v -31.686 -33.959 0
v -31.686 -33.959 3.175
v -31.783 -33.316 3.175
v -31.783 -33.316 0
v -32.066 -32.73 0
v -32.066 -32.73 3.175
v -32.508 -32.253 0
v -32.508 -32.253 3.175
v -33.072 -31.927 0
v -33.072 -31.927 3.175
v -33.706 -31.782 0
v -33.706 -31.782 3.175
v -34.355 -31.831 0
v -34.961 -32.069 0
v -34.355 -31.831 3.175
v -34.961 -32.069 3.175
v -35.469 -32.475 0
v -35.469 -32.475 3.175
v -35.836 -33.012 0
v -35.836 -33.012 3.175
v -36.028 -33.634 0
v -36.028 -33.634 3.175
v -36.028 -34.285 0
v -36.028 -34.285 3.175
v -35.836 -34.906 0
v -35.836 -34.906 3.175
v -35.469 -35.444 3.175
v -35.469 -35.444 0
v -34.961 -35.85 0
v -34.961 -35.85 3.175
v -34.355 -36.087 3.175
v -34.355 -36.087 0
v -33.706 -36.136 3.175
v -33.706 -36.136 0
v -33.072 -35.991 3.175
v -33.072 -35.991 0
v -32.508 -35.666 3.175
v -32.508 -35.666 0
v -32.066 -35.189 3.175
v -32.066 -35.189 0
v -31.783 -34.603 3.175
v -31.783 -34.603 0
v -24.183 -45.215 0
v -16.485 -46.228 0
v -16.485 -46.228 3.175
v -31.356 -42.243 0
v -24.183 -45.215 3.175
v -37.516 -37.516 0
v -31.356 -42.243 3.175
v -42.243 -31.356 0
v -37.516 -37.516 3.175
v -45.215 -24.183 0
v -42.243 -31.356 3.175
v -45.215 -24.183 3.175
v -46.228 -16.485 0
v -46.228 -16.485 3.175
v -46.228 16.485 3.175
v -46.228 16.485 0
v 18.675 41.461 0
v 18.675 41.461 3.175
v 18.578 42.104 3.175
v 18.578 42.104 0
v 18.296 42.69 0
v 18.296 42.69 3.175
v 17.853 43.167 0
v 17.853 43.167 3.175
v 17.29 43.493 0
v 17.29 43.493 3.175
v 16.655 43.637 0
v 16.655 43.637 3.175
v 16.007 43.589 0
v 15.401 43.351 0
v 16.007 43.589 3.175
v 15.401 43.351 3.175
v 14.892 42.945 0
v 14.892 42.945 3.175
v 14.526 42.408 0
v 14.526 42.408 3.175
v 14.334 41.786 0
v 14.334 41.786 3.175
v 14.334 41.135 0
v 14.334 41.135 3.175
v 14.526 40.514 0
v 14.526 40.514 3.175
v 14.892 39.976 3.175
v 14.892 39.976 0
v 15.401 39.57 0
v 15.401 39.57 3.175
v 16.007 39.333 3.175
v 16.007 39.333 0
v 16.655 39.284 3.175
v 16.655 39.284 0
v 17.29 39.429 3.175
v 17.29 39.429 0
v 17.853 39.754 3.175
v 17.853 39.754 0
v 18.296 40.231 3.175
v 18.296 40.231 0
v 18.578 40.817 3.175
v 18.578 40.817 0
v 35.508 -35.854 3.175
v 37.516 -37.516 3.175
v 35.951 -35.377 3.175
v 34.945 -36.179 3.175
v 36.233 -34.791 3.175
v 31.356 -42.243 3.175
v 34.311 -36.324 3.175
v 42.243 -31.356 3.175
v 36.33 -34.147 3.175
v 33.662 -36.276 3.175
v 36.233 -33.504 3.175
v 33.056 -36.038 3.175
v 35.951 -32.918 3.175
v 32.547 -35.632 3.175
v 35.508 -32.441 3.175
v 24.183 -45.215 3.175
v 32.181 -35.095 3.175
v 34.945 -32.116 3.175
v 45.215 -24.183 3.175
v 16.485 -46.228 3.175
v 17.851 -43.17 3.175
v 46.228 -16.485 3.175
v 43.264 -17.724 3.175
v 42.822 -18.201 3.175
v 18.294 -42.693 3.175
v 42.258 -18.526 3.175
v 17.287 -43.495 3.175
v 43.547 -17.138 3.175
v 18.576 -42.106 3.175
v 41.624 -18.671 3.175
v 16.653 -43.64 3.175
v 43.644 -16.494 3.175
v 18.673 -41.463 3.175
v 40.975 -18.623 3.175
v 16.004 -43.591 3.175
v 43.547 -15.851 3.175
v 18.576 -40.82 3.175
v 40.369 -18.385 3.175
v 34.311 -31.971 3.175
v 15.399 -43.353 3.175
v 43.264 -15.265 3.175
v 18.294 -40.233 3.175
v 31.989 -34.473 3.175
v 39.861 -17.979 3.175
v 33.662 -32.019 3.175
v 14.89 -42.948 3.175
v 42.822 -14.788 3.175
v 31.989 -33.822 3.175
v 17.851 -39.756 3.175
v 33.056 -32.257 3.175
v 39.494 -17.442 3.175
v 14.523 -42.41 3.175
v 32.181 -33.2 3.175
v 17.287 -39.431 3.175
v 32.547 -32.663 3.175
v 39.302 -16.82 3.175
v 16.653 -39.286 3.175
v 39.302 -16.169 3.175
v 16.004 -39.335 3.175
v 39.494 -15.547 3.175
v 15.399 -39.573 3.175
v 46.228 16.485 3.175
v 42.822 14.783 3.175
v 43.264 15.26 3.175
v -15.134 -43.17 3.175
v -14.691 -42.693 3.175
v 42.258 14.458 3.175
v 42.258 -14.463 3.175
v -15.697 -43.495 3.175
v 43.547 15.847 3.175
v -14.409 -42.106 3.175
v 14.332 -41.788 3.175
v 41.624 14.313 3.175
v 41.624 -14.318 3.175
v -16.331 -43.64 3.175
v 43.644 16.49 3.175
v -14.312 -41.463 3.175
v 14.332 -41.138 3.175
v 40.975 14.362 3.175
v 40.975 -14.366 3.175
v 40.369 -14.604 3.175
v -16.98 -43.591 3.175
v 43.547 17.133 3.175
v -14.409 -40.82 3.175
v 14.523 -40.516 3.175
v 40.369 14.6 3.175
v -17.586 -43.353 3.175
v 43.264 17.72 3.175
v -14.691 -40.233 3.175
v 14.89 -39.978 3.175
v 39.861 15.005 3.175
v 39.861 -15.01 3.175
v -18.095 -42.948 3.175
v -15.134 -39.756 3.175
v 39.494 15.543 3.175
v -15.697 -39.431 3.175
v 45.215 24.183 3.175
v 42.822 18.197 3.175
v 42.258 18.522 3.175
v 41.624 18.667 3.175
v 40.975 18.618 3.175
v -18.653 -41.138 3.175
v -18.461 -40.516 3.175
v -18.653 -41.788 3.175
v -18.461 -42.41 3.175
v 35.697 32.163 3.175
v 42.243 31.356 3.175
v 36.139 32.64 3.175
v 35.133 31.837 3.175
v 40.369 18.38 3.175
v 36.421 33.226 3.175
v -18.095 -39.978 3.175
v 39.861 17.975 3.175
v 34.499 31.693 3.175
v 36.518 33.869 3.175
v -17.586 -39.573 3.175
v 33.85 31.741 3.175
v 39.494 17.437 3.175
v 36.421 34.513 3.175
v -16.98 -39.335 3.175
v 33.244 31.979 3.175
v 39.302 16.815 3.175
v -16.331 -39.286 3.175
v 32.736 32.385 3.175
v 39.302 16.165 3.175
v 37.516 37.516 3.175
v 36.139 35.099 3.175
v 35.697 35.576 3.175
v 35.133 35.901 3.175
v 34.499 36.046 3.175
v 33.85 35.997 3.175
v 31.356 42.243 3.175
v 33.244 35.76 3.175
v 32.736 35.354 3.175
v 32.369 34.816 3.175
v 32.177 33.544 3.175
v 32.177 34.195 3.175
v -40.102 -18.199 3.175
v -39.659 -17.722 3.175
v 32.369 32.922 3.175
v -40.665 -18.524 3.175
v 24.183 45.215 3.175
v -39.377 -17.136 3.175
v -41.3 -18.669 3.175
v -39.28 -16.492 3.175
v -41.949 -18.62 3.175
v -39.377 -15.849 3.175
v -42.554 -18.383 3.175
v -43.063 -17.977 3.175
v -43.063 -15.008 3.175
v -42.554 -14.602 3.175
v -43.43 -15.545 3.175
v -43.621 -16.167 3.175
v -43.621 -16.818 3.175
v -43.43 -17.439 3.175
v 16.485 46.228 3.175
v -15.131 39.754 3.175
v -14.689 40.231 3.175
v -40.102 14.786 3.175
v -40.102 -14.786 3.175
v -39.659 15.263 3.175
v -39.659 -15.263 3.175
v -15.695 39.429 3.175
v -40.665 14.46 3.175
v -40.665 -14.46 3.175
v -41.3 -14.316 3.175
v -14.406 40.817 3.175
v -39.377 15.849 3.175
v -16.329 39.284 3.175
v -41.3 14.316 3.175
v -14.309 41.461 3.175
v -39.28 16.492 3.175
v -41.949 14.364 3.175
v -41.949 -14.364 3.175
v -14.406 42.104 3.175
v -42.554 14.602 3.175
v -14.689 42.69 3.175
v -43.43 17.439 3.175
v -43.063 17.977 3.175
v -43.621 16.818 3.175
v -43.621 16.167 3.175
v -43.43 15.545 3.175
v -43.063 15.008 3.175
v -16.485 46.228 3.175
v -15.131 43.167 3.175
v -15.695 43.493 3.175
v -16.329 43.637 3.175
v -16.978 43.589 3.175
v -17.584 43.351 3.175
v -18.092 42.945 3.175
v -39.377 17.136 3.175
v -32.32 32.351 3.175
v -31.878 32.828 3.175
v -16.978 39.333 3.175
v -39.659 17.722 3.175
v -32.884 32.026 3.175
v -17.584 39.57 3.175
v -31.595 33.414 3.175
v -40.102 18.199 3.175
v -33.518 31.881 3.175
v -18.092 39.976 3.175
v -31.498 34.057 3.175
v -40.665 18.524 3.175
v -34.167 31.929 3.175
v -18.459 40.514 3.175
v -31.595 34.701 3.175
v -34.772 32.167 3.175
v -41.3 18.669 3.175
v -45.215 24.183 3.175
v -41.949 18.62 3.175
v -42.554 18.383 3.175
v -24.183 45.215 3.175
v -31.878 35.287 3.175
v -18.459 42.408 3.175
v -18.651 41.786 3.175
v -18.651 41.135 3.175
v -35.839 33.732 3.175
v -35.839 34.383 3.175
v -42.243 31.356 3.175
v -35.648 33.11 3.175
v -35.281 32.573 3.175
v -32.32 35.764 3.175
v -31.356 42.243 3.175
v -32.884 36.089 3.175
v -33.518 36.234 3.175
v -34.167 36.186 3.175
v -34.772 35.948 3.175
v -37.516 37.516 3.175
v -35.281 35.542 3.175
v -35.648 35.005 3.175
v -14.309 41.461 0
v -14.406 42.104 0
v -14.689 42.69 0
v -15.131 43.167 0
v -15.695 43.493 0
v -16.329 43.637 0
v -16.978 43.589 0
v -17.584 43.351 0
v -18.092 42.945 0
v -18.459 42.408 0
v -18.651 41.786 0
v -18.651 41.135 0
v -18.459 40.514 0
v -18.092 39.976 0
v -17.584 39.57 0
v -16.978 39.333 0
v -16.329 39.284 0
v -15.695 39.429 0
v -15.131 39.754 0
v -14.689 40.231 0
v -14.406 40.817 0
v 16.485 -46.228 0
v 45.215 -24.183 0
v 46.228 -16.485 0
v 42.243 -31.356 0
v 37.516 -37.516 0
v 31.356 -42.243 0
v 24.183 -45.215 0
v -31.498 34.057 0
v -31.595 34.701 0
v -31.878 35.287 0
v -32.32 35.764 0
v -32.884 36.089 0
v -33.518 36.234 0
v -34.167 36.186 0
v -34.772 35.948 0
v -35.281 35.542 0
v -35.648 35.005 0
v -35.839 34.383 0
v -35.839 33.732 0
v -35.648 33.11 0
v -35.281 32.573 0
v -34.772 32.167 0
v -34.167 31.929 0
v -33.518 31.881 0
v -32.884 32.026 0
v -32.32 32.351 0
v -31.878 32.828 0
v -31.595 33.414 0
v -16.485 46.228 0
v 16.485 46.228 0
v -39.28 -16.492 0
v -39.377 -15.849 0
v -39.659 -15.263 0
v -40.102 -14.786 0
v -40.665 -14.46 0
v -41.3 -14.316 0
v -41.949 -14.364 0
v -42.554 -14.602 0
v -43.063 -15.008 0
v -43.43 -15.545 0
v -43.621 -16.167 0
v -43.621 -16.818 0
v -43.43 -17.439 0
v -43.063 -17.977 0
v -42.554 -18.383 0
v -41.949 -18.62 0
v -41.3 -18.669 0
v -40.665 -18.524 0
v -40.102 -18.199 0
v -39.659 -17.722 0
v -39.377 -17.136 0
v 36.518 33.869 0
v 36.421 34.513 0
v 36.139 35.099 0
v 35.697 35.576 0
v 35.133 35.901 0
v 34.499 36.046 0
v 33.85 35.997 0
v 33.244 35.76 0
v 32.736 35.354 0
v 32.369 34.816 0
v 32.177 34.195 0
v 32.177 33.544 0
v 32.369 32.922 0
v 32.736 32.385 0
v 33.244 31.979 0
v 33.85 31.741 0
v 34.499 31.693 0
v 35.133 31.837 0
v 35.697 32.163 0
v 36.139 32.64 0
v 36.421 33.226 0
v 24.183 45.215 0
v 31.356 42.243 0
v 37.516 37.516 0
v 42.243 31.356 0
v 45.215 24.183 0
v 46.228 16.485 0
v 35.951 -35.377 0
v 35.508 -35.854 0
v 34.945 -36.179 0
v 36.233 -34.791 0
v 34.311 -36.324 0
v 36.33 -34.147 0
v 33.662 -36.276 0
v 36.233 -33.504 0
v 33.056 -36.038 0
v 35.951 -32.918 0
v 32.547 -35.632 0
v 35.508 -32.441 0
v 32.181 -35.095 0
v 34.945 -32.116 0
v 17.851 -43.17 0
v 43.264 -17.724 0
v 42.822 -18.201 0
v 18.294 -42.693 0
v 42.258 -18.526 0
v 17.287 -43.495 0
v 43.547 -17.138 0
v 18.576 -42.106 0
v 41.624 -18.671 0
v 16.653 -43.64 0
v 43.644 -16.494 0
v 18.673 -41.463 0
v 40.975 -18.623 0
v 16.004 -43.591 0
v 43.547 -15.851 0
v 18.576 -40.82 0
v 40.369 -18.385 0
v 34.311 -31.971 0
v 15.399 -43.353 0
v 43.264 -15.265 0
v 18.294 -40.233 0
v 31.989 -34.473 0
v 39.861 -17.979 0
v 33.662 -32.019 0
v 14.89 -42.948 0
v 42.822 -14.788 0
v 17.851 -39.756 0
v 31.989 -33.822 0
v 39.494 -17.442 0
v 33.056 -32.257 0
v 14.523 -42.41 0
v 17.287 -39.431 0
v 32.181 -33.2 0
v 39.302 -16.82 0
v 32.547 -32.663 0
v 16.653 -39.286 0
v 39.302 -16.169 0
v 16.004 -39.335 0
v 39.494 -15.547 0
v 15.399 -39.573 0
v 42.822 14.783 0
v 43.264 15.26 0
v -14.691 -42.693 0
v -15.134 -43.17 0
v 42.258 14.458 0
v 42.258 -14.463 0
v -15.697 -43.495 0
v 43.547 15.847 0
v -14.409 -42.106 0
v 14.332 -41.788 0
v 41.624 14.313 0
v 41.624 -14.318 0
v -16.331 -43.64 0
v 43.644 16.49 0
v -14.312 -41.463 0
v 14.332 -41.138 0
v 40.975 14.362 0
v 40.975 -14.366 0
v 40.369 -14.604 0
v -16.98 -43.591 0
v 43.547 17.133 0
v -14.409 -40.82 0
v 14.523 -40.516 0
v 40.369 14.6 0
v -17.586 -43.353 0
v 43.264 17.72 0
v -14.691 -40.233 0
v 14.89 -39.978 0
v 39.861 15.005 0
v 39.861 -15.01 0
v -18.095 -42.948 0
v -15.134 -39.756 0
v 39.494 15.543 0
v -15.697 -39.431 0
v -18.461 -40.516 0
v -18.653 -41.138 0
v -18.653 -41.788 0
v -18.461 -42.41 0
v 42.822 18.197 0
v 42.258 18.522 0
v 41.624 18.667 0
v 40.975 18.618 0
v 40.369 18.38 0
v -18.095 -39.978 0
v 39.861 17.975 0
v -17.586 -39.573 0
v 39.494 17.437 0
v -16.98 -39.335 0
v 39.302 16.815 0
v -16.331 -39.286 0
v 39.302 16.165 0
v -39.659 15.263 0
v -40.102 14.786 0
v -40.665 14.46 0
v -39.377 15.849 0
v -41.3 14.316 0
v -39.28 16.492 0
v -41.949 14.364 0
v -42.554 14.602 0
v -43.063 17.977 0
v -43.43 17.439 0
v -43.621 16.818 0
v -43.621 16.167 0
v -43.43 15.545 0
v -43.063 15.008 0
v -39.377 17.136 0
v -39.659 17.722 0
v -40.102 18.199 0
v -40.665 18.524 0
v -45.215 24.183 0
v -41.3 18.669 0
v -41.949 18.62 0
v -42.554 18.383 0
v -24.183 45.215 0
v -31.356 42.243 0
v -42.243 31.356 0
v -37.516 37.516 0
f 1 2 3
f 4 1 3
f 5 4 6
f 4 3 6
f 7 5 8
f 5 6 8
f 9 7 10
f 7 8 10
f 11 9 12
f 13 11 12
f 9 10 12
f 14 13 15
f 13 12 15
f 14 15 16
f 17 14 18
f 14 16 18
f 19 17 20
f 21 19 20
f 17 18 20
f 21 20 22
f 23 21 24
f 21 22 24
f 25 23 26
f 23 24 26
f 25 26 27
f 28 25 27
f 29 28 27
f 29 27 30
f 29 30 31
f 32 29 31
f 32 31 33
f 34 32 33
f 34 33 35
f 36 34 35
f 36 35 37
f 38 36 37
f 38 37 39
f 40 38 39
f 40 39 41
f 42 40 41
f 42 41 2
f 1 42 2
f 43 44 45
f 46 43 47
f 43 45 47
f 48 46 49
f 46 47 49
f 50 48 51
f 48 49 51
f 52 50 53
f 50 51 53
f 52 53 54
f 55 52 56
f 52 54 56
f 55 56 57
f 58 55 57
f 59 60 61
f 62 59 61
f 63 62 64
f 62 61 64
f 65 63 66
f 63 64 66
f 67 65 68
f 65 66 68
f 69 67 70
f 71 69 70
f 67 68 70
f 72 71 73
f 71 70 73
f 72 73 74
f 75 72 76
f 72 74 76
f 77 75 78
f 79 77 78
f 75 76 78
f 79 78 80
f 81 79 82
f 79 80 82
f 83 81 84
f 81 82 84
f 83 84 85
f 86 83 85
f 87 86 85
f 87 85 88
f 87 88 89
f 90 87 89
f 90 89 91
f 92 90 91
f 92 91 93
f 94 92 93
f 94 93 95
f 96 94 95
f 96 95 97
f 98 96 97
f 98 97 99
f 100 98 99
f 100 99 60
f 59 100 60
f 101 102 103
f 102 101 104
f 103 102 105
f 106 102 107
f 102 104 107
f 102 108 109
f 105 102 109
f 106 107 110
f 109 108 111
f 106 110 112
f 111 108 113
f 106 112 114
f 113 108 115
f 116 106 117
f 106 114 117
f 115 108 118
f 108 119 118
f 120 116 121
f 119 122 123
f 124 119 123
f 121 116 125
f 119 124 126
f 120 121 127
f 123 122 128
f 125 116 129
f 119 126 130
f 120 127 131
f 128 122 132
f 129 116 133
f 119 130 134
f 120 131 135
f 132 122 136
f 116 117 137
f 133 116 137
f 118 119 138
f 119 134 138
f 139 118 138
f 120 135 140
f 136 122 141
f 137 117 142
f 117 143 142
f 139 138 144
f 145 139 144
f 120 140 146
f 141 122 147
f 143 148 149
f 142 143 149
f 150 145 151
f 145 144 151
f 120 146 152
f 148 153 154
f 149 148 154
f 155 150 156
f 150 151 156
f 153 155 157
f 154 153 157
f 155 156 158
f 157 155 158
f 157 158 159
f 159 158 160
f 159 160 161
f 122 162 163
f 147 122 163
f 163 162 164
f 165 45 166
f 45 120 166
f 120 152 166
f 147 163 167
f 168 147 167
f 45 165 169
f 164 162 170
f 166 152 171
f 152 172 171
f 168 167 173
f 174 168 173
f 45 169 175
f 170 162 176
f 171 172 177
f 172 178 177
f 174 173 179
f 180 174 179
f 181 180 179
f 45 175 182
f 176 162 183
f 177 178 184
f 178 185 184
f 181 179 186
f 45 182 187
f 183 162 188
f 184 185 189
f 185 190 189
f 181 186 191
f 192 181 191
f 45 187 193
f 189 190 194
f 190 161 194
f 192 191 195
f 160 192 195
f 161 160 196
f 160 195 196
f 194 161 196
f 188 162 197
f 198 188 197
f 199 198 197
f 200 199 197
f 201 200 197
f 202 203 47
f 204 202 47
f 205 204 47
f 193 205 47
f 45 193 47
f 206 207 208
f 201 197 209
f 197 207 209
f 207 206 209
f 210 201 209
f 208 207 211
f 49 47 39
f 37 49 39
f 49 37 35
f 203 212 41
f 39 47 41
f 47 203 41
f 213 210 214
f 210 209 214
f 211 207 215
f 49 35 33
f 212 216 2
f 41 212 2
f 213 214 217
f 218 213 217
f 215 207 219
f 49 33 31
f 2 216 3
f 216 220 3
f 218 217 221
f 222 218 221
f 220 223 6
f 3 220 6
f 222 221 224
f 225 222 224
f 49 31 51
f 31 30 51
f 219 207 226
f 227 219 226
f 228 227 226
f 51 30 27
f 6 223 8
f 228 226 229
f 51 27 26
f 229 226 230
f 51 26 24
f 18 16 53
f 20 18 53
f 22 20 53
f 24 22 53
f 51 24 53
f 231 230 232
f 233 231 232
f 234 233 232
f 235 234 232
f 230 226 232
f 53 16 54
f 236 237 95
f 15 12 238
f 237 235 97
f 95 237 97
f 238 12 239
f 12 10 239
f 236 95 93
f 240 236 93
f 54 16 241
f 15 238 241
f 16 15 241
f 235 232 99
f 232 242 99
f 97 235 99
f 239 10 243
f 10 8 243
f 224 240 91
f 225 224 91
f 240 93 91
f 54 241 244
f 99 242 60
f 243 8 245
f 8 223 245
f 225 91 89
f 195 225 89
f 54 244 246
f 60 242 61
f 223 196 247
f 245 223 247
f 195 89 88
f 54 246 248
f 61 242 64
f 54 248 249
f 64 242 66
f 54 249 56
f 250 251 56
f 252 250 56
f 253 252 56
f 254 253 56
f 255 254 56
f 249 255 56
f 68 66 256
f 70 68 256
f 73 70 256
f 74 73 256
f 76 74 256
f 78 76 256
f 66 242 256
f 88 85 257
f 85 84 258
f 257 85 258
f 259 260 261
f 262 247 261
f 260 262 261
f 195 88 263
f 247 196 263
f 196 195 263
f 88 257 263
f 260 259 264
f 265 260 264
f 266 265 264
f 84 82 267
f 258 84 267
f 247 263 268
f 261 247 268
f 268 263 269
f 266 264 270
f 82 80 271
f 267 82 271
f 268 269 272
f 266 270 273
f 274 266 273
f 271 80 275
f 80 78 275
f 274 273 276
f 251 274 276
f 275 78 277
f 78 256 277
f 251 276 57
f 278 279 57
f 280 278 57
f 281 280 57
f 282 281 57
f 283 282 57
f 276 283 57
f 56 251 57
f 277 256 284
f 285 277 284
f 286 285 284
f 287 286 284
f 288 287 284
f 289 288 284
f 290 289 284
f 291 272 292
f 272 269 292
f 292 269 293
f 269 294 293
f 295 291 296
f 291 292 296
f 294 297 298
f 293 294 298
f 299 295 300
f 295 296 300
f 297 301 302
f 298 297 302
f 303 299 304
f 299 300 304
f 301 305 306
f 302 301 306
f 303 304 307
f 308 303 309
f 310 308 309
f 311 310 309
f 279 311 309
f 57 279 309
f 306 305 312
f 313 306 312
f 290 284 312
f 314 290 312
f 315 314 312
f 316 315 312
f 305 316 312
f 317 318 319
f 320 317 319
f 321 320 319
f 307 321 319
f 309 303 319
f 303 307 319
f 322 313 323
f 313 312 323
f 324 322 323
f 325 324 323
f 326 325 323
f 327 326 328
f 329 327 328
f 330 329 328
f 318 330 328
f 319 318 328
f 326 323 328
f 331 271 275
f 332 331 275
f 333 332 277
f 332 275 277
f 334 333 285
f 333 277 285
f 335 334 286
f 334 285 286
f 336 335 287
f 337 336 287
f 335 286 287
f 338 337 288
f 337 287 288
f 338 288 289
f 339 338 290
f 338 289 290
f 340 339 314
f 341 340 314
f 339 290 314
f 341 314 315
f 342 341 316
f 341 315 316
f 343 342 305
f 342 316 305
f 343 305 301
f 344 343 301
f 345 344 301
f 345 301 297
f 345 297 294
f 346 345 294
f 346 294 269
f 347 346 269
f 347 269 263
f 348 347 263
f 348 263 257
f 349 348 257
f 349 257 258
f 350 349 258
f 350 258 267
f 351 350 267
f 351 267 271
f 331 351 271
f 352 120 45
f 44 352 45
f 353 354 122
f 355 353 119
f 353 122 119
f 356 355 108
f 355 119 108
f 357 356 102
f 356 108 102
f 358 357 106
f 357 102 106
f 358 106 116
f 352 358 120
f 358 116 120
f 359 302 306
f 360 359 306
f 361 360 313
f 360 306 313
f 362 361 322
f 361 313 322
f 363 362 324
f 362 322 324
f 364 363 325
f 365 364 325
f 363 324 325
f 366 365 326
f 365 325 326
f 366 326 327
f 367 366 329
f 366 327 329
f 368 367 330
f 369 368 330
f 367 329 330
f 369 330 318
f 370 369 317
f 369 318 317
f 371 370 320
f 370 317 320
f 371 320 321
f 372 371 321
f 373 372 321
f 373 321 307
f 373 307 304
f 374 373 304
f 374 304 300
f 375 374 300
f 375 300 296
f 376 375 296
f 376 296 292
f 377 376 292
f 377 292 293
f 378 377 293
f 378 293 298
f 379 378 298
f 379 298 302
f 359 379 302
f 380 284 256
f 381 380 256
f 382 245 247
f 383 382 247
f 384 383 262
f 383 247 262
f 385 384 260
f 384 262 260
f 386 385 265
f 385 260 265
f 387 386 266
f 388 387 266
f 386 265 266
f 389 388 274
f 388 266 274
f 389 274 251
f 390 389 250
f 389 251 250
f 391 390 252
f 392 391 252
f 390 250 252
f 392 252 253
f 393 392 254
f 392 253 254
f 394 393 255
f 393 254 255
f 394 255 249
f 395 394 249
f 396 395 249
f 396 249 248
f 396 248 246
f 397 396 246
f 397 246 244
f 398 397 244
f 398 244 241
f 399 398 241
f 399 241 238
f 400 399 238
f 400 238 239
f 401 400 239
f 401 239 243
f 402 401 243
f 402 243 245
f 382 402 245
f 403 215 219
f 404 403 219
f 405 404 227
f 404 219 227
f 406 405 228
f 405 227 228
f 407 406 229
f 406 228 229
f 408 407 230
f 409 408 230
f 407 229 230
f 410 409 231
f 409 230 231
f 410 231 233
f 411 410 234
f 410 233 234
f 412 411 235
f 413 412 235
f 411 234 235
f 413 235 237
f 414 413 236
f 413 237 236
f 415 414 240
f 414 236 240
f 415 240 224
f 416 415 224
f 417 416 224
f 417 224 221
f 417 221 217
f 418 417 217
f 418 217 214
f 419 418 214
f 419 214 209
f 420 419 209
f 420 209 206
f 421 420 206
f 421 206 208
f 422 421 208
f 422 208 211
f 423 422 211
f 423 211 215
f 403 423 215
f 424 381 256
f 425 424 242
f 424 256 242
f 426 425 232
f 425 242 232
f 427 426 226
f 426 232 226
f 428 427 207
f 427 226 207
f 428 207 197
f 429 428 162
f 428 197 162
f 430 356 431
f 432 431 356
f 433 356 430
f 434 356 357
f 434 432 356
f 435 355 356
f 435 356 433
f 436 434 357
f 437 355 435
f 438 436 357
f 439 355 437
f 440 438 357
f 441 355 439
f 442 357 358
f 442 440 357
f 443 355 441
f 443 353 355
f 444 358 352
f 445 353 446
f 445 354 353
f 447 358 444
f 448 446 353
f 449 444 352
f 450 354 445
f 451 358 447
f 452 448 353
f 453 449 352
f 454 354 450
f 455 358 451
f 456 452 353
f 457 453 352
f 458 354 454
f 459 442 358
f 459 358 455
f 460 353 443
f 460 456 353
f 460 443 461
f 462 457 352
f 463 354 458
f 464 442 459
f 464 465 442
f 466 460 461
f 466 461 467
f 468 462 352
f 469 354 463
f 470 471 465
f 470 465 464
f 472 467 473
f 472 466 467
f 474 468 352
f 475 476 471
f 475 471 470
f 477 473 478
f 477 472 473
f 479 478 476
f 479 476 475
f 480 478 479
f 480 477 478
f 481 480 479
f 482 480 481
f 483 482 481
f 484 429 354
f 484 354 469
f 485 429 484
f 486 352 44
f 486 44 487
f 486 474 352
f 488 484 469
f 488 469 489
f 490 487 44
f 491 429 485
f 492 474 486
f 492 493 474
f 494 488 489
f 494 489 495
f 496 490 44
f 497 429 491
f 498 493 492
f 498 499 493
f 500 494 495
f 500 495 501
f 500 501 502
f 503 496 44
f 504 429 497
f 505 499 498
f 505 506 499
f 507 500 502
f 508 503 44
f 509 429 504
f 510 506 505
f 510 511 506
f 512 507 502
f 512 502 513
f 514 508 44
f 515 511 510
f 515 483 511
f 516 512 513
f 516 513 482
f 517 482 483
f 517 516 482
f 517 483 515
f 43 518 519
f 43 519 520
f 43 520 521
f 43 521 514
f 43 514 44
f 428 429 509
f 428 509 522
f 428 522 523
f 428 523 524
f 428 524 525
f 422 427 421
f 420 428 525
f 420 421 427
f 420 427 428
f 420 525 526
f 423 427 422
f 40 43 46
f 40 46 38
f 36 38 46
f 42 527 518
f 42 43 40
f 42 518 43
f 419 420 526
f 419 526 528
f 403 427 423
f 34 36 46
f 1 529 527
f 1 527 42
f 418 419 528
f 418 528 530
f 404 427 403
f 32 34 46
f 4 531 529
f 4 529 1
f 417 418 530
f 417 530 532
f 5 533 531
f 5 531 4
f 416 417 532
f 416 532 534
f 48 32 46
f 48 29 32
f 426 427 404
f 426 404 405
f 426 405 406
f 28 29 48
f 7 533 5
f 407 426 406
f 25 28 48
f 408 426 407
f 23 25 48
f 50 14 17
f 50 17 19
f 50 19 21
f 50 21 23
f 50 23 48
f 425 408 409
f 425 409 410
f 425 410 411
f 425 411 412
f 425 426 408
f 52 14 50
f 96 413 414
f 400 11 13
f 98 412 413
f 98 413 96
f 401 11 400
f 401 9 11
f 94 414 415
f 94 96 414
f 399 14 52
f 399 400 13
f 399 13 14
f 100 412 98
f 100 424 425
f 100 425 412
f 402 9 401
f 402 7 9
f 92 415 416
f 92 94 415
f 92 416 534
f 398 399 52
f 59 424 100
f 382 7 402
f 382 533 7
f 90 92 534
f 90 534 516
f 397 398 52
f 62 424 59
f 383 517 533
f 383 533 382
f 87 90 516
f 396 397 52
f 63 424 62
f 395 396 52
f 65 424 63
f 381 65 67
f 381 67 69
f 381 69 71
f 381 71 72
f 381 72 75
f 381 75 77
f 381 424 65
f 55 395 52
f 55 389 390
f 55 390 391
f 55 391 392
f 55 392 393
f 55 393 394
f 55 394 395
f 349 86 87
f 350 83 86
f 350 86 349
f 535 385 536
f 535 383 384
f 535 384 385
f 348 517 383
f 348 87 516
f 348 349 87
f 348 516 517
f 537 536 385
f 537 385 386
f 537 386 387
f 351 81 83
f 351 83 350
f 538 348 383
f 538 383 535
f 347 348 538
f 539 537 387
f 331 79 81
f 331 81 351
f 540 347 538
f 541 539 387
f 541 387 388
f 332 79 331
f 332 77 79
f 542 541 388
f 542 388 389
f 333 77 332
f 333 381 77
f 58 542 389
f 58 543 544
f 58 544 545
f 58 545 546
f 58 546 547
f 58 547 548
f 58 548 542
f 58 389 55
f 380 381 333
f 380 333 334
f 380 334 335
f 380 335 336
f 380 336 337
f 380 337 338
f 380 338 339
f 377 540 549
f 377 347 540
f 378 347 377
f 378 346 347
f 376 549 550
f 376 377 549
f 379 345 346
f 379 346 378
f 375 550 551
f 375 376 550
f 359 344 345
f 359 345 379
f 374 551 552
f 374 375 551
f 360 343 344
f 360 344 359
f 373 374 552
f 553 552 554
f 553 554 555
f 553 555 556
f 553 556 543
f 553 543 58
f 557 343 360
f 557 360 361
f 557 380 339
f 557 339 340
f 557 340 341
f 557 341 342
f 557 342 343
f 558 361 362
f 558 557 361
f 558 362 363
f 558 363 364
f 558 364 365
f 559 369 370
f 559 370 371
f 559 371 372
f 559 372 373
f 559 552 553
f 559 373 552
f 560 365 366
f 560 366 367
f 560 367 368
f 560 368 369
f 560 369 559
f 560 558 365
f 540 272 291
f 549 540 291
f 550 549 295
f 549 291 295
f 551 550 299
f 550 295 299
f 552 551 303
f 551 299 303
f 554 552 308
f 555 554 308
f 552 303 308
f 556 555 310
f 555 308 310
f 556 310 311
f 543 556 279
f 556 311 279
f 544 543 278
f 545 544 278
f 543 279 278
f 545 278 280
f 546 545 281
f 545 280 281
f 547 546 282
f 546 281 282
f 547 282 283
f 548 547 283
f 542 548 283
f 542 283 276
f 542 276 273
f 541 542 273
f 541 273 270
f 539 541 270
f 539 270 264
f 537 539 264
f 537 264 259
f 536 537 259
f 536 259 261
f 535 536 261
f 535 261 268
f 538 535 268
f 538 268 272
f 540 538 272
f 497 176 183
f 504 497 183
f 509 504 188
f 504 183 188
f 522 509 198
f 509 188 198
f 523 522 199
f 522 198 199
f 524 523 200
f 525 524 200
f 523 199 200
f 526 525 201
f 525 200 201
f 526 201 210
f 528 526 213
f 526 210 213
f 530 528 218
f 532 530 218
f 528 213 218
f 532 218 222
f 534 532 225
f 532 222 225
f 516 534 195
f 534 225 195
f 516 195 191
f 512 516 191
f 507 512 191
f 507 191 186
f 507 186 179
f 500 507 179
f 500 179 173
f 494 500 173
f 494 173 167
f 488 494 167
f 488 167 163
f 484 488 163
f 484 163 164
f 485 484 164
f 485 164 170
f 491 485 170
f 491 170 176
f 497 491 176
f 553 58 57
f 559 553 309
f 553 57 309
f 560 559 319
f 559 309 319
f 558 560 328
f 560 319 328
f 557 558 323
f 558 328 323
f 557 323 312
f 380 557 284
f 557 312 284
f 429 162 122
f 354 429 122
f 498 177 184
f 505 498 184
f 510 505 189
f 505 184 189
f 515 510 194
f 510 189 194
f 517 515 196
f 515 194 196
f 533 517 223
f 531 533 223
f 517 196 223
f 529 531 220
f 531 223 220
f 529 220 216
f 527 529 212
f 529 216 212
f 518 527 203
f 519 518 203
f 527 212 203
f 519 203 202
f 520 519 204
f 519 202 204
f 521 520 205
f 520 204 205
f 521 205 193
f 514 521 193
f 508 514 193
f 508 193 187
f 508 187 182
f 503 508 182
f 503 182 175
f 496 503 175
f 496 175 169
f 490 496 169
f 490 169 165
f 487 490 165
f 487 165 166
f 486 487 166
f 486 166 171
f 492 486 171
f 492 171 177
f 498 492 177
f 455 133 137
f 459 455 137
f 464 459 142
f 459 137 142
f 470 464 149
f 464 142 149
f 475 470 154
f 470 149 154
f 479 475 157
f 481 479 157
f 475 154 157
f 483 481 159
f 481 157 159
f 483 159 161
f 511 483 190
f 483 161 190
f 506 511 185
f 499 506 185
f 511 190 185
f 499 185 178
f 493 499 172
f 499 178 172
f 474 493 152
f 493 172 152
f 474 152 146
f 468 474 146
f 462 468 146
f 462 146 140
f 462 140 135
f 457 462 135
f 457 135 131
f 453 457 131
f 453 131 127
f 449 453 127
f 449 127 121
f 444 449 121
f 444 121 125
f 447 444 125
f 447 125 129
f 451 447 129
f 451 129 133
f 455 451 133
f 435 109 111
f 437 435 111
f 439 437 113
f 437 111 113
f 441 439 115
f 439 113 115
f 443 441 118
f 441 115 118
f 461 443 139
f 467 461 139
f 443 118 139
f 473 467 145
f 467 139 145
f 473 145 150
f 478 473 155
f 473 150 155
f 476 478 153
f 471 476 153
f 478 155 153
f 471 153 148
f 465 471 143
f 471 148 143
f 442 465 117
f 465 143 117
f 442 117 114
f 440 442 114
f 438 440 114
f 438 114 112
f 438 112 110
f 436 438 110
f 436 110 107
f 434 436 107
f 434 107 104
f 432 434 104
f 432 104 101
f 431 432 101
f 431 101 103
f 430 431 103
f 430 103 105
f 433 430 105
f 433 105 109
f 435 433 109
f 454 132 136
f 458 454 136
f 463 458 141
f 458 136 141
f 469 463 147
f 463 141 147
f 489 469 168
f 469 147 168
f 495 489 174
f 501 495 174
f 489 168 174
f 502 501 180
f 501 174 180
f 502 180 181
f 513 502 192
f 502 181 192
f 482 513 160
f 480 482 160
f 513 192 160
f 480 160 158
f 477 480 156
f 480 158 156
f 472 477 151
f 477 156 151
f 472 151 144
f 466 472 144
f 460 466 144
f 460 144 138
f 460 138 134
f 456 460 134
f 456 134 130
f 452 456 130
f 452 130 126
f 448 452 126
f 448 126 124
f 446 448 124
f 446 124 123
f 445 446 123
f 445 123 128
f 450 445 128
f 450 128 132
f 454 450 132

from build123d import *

# Parameters (mm, degrees)
BOSS_EXTRUDE1_DEPTH = 3.175
CUT_EXTRUDE2_REACH  = 69.068
SKETCH3_R           = 2.1828125
SKETCH4_W           = 109.59125296
SKETCH4_H           = 128.097404578
CUT_EXTRUDE3_DEPTH  = 68.067905193


with BuildPart() as part:
    # Sketch1 → Boss-Extrude1 (new body)
    with BuildSketch(Plane.XY):
        with BuildLine():
            Line((46.57725, -47.371), (-46.57725, -47.371))
            ThreePointArc((-46.57725, -47.371), (-47.138516008, -47.138516008), (-47.371, -46.57725))
            Line((-47.371, -46.57725), (-47.371, 46.57725))
            ThreePointArc((-47.371, 46.57725), (-47.138516008, 47.138516008), (-46.57725, 47.371))
            Line((-46.57725, 47.371), (46.57725, 47.371))
            ThreePointArc((46.57725, 47.371), (47.138516008, 47.138516008), (47.371, 46.57725))
            Line((47.371, 46.57725), (47.371, -46.57725))
            ThreePointArc((47.371, -46.57725), (47.138516008, -47.138516008), (46.57725, -47.371))
        make_face()
    extrude(amount=BOSS_EXTRUDE1_DEPTH)

    # Sketch3 → Cut-Extrude2 (cut, up to next)
    with BuildSketch(Plane.XY.offset(3.175), mode=Mode.PRIVATE) as cut_extrude2_sk1:
        with Locations((16.490011722, -41.462970183)):
            Circle(SKETCH3_R)
    cut_extrude2_tool1 = extrude(cut_extrude2_sk1.sketch, amount=-CUT_EXTRUDE2_REACH, mode=Mode.PRIVATE) & part.part
    # Sketch3 → Cut-Extrude2 (cut, up to next)
    with BuildSketch(Plane.XY.offset(3.175), mode=Mode.PRIVATE) as cut_extrude2_sk2:
        with Locations((34.1474239, -34.1474239)):
            Circle(SKETCH3_R)
    cut_extrude2_tool2 = extrude(cut_extrude2_sk2.sketch, amount=-CUT_EXTRUDE2_REACH, mode=Mode.PRIVATE) & part.part
    # Sketch3 → Cut-Extrude2 (cut, up to next)
    with BuildSketch(Plane.XY.offset(3.175), mode=Mode.PRIVATE) as cut_extrude2_sk3:
        with Locations((41.460741539, -16.494469011)):
            Circle(SKETCH3_R)
    cut_extrude2_tool3 = extrude(cut_extrude2_sk3.sketch, amount=-CUT_EXTRUDE2_REACH, mode=Mode.PRIVATE) & part.part
    # Sketch3 → Cut-Extrude2 (cut, up to next)
    with BuildSketch(Plane.XY.offset(3.175), mode=Mode.PRIVATE) as cut_extrude2_sk4:
        with Locations((41.460741539, 16.490011722)):
            Circle(SKETCH3_R)
    cut_extrude2_tool4 = extrude(cut_extrude2_sk4.sketch, amount=-CUT_EXTRUDE2_REACH, mode=Mode.PRIVATE) & part.part
    # Sketch3 → Cut-Extrude2 (cut, up to next)
    with BuildSketch(Plane.XY.offset(3.175), mode=Mode.PRIVATE) as cut_extrude2_sk5:
        with Locations((34.335639739, 33.869270843)):
            Circle(SKETCH3_R)
    cut_extrude2_tool5 = extrude(cut_extrude2_sk5.sketch, amount=-CUT_EXTRUDE2_REACH, mode=Mode.PRIVATE) & part.part
    # Sketch3 → Cut-Extrude2 (cut, up to next)
    with BuildSketch(Plane.XY.offset(3.175), mode=Mode.PRIVATE) as cut_extrude2_sk6:
        with Locations((16.492240366, 41.460741539)):
            Circle(SKETCH3_R)
    cut_extrude2_tool6 = extrude(cut_extrude2_sk6.sketch, amount=-CUT_EXTRUDE2_REACH, mode=Mode.PRIVATE) & part.part
    # Sketch3 → Cut-Extrude2 (cut, up to next)
    with BuildSketch(Plane.XY.offset(3.175), mode=Mode.PRIVATE) as cut_extrude2_sk7:
        with Locations((-16.492240366, 41.460741539)):
            Circle(SKETCH3_R)
    cut_extrude2_tool7 = extrude(cut_extrude2_sk7.sketch, amount=-CUT_EXTRUDE2_REACH, mode=Mode.PRIVATE) & part.part
    # Sketch3 → Cut-Extrude2 (cut, up to next)
    with BuildSketch(Plane.XY.offset(3.175), mode=Mode.PRIVATE) as cut_extrude2_sk8:
        with Locations((-33.681055005, 34.057486682)):
            Circle(SKETCH3_R)
    cut_extrude2_tool8 = extrude(cut_extrude2_sk8.sketch, amount=-CUT_EXTRUDE2_REACH, mode=Mode.PRIVATE) & part.part
    # Sketch3 → Cut-Extrude2 (cut, up to next)
    with BuildSketch(Plane.XY.offset(3.175), mode=Mode.PRIVATE) as cut_extrude2_sk9:
        with Locations((-41.462970183, 16.492240366)):
            Circle(SKETCH3_R)
    cut_extrude2_tool9 = extrude(cut_extrude2_sk9.sketch, amount=-CUT_EXTRUDE2_REACH, mode=Mode.PRIVATE) & part.part
    # Sketch3 → Cut-Extrude2 (cut, up to next)
    with BuildSketch(Plane.XY.offset(3.175), mode=Mode.PRIVATE) as cut_extrude2_sk10:
        with Locations((-41.462970183, -16.492240366)):
            Circle(SKETCH3_R)
    cut_extrude2_tool10 = extrude(cut_extrude2_sk10.sketch, amount=-CUT_EXTRUDE2_REACH, mode=Mode.PRIVATE) & part.part
    # Sketch3 → Cut-Extrude2 (cut, up to next)
    with BuildSketch(Plane.XY.offset(3.175), mode=Mode.PRIVATE) as cut_extrude2_sk11:
        with Locations((-16.494469011, -41.462970183)):
            Circle(SKETCH3_R)
    cut_extrude2_tool11 = extrude(cut_extrude2_sk11.sketch, amount=-CUT_EXTRUDE2_REACH, mode=Mode.PRIVATE) & part.part
    # Sketch3 → Cut-Extrude2 (cut, up to next)
    with BuildSketch(Plane.XY.offset(3.175), mode=Mode.PRIVATE) as cut_extrude2_sk12:
        with Locations((-33.869270843, -33.959208062)):
            Circle(SKETCH3_R)
    cut_extrude2_tool12 = extrude(cut_extrude2_sk12.sketch, amount=-CUT_EXTRUDE2_REACH, mode=Mode.PRIVATE) & part.part
    add(cut_extrude2_tool1.solids().sort_by_distance((16.490012, -41.46297, 3.175))[0], mode=Mode.SUBTRACT)
    add(cut_extrude2_tool2.solids().sort_by_distance((34.147424, -34.147424, 3.175))[0], mode=Mode.SUBTRACT)
    add(cut_extrude2_tool3.solids().sort_by_distance((41.460742, -16.494469, 3.175))[0], mode=Mode.SUBTRACT)
    add(cut_extrude2_tool4.solids().sort_by_distance((41.460742, 16.490012, 3.175))[0], mode=Mode.SUBTRACT)
    add(cut_extrude2_tool5.solids().sort_by_distance((34.33564, 33.869271, 3.175))[0], mode=Mode.SUBTRACT)
    add(cut_extrude2_tool6.solids().sort_by_distance((16.49224, 41.460742, 3.175))[0], mode=Mode.SUBTRACT)
    add(cut_extrude2_tool7.solids().sort_by_distance((-16.49224, 41.460742, 3.175))[0], mode=Mode.SUBTRACT)
    add(cut_extrude2_tool8.solids().sort_by_distance((-33.681055, 34.057487, 3.175))[0], mode=Mode.SUBTRACT)
    add(cut_extrude2_tool9.solids().sort_by_distance((-41.46297, 16.49224, 3.175))[0], mode=Mode.SUBTRACT)
    add(cut_extrude2_tool10.solids().sort_by_distance((-41.46297, -16.49224, 3.175))[0], mode=Mode.SUBTRACT)
    add(cut_extrude2_tool11.solids().sort_by_distance((-16.494469, -41.46297, 3.175))[0], mode=Mode.SUBTRACT)
    add(cut_extrude2_tool12.solids().sort_by_distance((-33.869271, -33.959208, 3.175))[0], mode=Mode.SUBTRACT)

    # Sketch4 → Cut-Extrude3 (cut, through all)
    with BuildSketch(Plane.XY.offset(3.175)):
        Rectangle(SKETCH4_W, SKETCH4_H)
        with BuildLine():
            Line((16.4846, -46.228), (-16.4846, -46.228))
            ThreePointArc((-16.4846, -46.228), (-37.516359836, -37.516359836), (-46.228, -16.4846))
            Line((-46.228, -16.4846), (-46.228, 16.4846))
            ThreePointArc((-46.228, 16.4846), (-37.516359836, 37.516359836), (-16.4846, 46.228))
            Line((-16.4846, 46.228), (16.4846, 46.228))
            ThreePointArc((16.4846, 46.228), (37.516359836, 37.516359836), (46.228, 16.4846))
            Line((46.228, 16.4846), (46.228, -16.4846))
            ThreePointArc((46.228, -16.4846), (37.516359836, -37.516359836), (16.4846, -46.228))
        make_face(mode=Mode.SUBTRACT)
    extrude(amount=-CUT_EXTRUDE3_DEPTH, mode=Mode.SUBTRACT)


solid = part.part
